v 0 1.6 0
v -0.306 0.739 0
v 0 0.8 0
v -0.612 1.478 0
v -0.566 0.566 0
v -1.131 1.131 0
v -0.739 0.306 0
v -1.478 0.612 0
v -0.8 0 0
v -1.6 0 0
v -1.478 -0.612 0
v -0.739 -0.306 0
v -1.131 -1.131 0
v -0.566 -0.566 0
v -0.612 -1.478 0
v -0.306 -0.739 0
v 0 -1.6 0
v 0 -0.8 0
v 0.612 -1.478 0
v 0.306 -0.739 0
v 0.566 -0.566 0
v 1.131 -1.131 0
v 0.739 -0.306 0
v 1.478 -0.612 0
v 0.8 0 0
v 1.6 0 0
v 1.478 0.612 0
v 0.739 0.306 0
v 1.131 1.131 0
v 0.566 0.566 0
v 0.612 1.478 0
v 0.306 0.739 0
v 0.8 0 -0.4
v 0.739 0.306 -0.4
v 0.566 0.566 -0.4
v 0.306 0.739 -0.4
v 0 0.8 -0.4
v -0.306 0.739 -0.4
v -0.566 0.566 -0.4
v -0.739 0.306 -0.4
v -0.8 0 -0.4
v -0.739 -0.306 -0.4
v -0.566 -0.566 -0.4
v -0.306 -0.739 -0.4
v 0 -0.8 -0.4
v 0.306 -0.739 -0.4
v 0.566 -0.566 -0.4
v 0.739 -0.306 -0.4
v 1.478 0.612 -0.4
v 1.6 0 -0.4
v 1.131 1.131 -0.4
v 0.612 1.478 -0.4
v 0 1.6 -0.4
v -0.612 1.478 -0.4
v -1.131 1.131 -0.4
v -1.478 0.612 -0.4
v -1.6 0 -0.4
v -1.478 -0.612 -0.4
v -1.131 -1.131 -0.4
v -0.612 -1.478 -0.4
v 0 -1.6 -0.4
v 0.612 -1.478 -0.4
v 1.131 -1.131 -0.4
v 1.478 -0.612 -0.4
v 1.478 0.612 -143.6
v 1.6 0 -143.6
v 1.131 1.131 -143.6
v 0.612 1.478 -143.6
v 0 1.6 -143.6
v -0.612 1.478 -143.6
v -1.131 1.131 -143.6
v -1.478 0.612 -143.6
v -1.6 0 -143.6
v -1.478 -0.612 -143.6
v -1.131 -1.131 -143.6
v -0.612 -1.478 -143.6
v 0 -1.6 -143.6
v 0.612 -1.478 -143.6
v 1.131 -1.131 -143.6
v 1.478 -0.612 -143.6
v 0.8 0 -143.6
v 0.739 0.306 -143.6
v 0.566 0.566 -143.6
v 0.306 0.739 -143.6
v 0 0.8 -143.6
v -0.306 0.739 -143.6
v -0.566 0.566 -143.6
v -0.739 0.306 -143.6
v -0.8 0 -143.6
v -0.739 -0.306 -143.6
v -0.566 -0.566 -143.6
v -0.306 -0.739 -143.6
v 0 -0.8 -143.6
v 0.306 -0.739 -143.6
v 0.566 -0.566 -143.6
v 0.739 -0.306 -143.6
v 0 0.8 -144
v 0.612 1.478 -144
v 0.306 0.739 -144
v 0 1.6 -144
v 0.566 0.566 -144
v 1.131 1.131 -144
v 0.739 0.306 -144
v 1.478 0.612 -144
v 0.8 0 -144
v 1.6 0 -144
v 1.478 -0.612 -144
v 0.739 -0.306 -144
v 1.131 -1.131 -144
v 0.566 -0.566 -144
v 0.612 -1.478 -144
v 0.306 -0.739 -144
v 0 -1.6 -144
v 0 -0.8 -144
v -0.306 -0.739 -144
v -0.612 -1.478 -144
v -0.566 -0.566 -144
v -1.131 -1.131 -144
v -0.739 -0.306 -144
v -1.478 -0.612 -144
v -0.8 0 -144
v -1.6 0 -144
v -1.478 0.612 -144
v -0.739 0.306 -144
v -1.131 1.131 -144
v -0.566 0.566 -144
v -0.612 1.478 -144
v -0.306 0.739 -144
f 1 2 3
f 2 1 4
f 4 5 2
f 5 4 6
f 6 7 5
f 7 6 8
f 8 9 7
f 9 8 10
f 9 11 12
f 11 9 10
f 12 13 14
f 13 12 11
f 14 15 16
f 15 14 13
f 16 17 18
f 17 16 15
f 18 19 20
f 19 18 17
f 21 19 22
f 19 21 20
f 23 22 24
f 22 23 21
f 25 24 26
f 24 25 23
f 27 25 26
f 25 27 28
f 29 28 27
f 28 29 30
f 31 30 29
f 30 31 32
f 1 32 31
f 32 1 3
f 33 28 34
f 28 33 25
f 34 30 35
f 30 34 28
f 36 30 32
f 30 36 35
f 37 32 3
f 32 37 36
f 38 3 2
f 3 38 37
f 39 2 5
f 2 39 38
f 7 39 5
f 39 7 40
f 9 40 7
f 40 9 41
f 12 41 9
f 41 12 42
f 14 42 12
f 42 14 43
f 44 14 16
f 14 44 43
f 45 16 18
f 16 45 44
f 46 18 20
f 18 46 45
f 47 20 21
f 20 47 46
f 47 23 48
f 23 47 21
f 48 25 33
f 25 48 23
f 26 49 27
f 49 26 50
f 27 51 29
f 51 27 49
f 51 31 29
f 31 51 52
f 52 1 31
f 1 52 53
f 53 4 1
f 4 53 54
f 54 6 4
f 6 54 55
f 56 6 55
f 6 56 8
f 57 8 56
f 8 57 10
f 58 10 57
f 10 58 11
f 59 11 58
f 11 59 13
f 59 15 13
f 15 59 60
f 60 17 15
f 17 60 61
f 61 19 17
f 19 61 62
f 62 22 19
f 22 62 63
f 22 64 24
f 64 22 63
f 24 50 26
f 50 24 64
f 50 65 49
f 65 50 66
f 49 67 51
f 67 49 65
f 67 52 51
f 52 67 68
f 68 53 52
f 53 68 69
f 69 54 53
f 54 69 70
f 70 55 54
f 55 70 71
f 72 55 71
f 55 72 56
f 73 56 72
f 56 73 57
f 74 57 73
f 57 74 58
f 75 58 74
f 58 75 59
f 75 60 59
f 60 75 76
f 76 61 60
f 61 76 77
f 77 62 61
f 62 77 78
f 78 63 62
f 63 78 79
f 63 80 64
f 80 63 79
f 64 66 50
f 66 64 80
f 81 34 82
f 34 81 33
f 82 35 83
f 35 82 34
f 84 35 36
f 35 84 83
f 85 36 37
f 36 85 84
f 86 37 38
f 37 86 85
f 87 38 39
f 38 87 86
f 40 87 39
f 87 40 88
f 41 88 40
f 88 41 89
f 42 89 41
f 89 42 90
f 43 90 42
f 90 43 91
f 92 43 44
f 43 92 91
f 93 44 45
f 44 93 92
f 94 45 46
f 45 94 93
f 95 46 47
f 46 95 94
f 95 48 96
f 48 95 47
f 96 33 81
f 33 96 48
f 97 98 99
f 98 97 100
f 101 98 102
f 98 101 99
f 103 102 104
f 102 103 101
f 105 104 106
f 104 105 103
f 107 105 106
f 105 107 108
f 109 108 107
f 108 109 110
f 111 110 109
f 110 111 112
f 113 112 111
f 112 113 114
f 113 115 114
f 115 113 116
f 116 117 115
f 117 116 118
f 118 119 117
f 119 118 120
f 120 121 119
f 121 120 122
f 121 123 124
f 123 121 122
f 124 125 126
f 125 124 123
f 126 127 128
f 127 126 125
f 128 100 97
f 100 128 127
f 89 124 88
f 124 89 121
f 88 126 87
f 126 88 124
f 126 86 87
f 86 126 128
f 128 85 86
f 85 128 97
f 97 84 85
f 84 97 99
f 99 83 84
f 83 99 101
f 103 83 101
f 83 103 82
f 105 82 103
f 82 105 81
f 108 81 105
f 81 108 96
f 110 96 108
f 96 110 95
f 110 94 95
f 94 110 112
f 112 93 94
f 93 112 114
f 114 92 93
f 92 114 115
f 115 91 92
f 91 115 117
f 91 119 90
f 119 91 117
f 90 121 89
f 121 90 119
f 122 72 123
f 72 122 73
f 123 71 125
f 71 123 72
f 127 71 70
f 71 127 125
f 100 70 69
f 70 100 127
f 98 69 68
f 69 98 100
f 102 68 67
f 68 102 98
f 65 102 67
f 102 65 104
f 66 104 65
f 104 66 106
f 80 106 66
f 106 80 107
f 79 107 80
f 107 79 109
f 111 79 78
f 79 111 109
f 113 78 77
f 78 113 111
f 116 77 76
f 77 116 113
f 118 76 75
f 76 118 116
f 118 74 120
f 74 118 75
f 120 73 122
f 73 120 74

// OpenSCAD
// file: ../p/4-4ring1.scad
use <../lib.scad>
function ldraw_lib__4_4ring1() = [
// 0 Ring  1 x 1.0
// 0 Name: 4-4ring1.dat
// 0 Author: James Jessiman
// 0 !LDRAW_ORG Primitive UPDATE 2009-01
// 0 !LICENSE Licensed under CC BY 2.0 and CC BY 4.0 : see CAreadme.txt
// 
// 0 BFC CERTIFY CCW
  [0,"BFC","CERTIFY"],
  [0,"BFC","CCW"],
// 
// 0 !HISTORY 1998-12-15 [PTadmin] Official Update 1998-10
// 0 !HISTORY 2002-04-08 [BrickCaster] Modified for BFC compliance
// 0 !HISTORY 2002-04-25 [PTadmin] Official Update 2002-02
// 0 !HISTORY 2007-06-24 [PTadmin] Header formatted for Contributor Agreement
// 0 !HISTORY 2008-07-01 [PTadmin] Official Update 2008-01
// 0 !HISTORY 2008-08-26 [cwdee] Switch polygon winding and rename
// 0 !HISTORY 2009-05-02 [PTadmin] Official Update 2009-01
// 
// 
// 4 16 -0.7654 0 1.8478 -0.3827 0 0.9239 0 0 1 0 0 2
  [4,16,-0.7654,0,1.8478,-0.3827,0,0.9239,0,0,1,0,0,2],
// 4 16 -1.4142 0 1.4142 -0.7071 0 0.7071 -0.3827 0 0.9239 -0.7654 0 1.8478
  [4,16,-1.4142,0,1.4142,-0.7071,0,0.7071,-0.3827,0,0.9239,-0.7654,0,1.8478],
// 4 16 -1.8478 0 0.7654 -0.9239 0 0.3827 -0.7071 0 0.7071 -1.4142 0 1.41420
  [4,16,-1.8478,0,0.7654,-0.9239,0,0.3827,-0.7071,0,0.7071,-1.4142,0,1.41420],
// 4 16 -2 0 0 -1 0 0 -0.9239 0 0.3827 -1.8478 0 0.7654
  [4,16,-2,0,0,-1,0,0,-0.9239,0,0.3827,-1.8478,0,0.7654],
// 4 16 -1.8478 0 -0.7654 -0.9239 0 -0.3827 -1 0 0 -2 0 0
  [4,16,-1.8478,0,-0.7654,-0.9239,0,-0.3827,-1,0,0,-2,0,0],
// 4 16 -1.4142 0 -1.4142 -0.7071 0 -0.7071 -0.9239 0 -0.3827 -1.8478 0 -0.7654
  [4,16,-1.4142,0,-1.4142,-0.7071,0,-0.7071,-0.9239,0,-0.3827,-1.8478,0,-0.7654],
// 4 16 -0.7654 0 -1.8478 -0.3827 0 -0.9239 -0.7071 0 -0.7071 -1.4142 0 -1.4142
  [4,16,-0.7654,0,-1.8478,-0.3827,0,-0.9239,-0.7071,0,-0.7071,-1.4142,0,-1.4142],
// 4 16 0 0 -2 0 0 -1 -0.3827 0 -0.9239 -0.7654 0 -1.8478
  [4,16,0,0,-2,0,0,-1,-0.3827,0,-0.9239,-0.7654,0,-1.8478],
// 4 16 0.7654 0 -1.8478 0.3827 0 -0.9239 0 0 -1 0 0 -2
  [4,16,0.7654,0,-1.8478,0.3827,0,-0.9239,0,0,-1,0,0,-2],
// 4 16 1.4142 0 -1.4142 0.7071 0 -0.7071 0.3827 0 -0.9239 0.7654 0 -1.8478
  [4,16,1.4142,0,-1.4142,0.7071,0,-0.7071,0.3827,0,-0.9239,0.7654,0,-1.8478],
// 4 16 1.8478 0 -0.7654 0.9239 0 -0.3827 0.7071 0 -0.7071 1.4142 0 -1.4142
  [4,16,1.8478,0,-0.7654,0.9239,0,-0.3827,0.7071,0,-0.7071,1.4142,0,-1.4142],
// 4 16 2 0 0 1 0 0 0.9239 0 -0.3827 1.8478 0 -0.7654
  [4,16,2,0,0,1,0,0,0.9239,0,-0.3827,1.8478,0,-0.7654],
// 4 16 1.8478 0 0.7654 0.9239 0 0.3827 1 0 0 2 0 0
  [4,16,1.8478,0,0.7654,0.9239,0,0.3827,1,0,0,2,0,0],
// 4 16 1.4142 0 1.4142 0.7071 0 0.7071 0.9239 0 0.3827 1.8478 0 0.7654
  [4,16,1.4142,0,1.4142,0.7071,0,0.7071,0.9239,0,0.3827,1.8478,0,0.7654],
// 4 16 0.7654 0 1.8478 0.3827 0 0.9239 0.7071 0 0.7071 1.4142 0 1.4142
  [4,16,0.7654,0,1.8478,0.3827,0,0.9239,0.7071,0,0.7071,1.4142,0,1.4142],
// 4 16 0 0 2 0 0 1 0.3827 0 0.9239 0.7654 0 1.8478
  [4,16,0,0,2,0,0,1,0.3827,0,0.9239,0.7654,0,1.8478],
// 0
];
module ldraw_lib__4_4ring1(step=0, col=false, unit=2/5, alt=false, line=0.2, solid=!$preview)
    makepoly(ldraw_lib__4_4ring1(), step=step, col=col, unit=unit, alt=alt, line=line, solid=solid);
ldraw_lib__4_4ring1(line=0.2);
// file: ../p/4-4edge.scad
use <../lib.scad>
function ldraw_lib__4_4edge() = [
// 0 Circle 1.0
// 0 Name: 4-4edge.dat
// 0 Author: James Jessiman
// 0 !LDRAW_ORG Primitive UPDATE 2017-01
// 0 !LICENSE Licensed under CC BY 2.0 and CC BY 4.0 : see CAreadme.txt
// 
// 0 BFC CERTIFY CCW
  [0,"BFC","CERTIFY"],
  [0,"BFC","CCW"],
// 
// 0 !HISTORY 1998-12-15 [PTadmin] Official Update 1998-10
// 0 !HISTORY 2005-12-28 [PTadmin] Official Update 2005-01
// 0 !HISTORY 2007-06-24 [PTadmin] Header formatted for Contributor Agreement
// 0 !HISTORY 2008-07-01 [PTadmin] Official Update 2008-01
// 0 !HISTORY 2017-01-15 [Steffen] BFCed
// 0 !HISTORY 2017-12-30 [PTadmin] Official Update 2017-01
// 
// 
// 2 24 1 0 0 0.9239 0 0.3827
  [2,24,1,0,0,0.9239,0,0.3827],
// 2 24 0.9239 0 0.3827 0.7071 0 0.7071
  [2,24,0.9239,0,0.3827,0.7071,0,0.7071],
// 2 24 0.7071 0 0.7071 0.3827 0 0.9239
  [2,24,0.7071,0,0.7071,0.3827,0,0.9239],
// 2 24 0.3827 0 0.9239 0 0 1
  [2,24,0.3827,0,0.9239,0,0,1],
// 2 24 0 0 1 -0.3827 0 0.9239
  [2,24,0,0,1,-0.3827,0,0.9239],
// 2 24 -0.3827 0 0.9239 -0.7071 0 0.7071
  [2,24,-0.3827,0,0.9239,-0.7071,0,0.7071],
// 2 24 -0.7071 0 0.7071 -0.9239 0 0.3827
  [2,24,-0.7071,0,0.7071,-0.9239,0,0.3827],
// 2 24 -0.9239 0 0.3827 -1 0 -0
  [2,24,-0.9239,0,0.3827,-1,0,-0],
// 2 24 -1 0 -0 -0.9239 0 -0.3827
  [2,24,-1,0,-0,-0.9239,0,-0.3827],
// 2 24 -0.9239 0 -0.3827 -0.7071 0 -0.7071
  [2,24,-0.9239,0,-0.3827,-0.7071,0,-0.7071],
// 2 24 -0.7071 0 -0.7071 -0.3827 0 -0.9239
  [2,24,-0.7071,0,-0.7071,-0.3827,0,-0.9239],
// 2 24 -0.3827 0 -0.9239 0 0 -1
  [2,24,-0.3827,0,-0.9239,0,0,-1],
// 2 24 0 0 -1 0.3827 0 -0.9239
  [2,24,0,0,-1,0.3827,0,-0.9239],
// 2 24 0.3827 0 -0.9239 0.7071 0 -0.7071
  [2,24,0.3827,0,-0.9239,0.7071,0,-0.7071],
// 2 24 0.7071 0 -0.7071 0.9239 0 -0.3827
  [2,24,0.7071,0,-0.7071,0.9239,0,-0.3827],
// 2 24 0.9239 0 -0.3827 1 0 0
  [2,24,0.9239,0,-0.3827,1,0,0],
];
module ldraw_lib__4_4edge(step=0, col=false, unit=2/5, alt=false, line=0.2, solid=!$preview)
    makepoly(ldraw_lib__4_4edge(), step=step, col=col, unit=unit, alt=alt, line=line, solid=solid);
ldraw_lib__4_4edge(line=0.2);
// file: ../p/4-4cyli.scad
use <../lib.scad>
function ldraw_lib__4_4cyli() = [
// 0 Cylinder 1.0
// 0 Name: 4-4cyli.dat
// 0 Author: James Jessiman
// 0 !LDRAW_ORG Primitive UPDATE 2005-01
// 0 !LICENSE Licensed under CC BY 2.0 and CC BY 4.0 : see CAreadme.txt
// 
// 0 BFC CERTIFY CCW
  [0,"BFC","CERTIFY"],
  [0,"BFC","CCW"],
// 
// 0 !HISTORY 1998-12-15 [PTadmin] Official Update 1998-10
// 0 !HISTORY 2002-03-23 [sbliss] Added BFC statement; merged headers from files in distributions LDraw 0.27 and Complete.
// 0 !HISTORY 2002-04-25 [PTadmin] Official Update 2002-02
// 0 !HISTORY 2004-12-14 [guyvivan] BFC CCW
// 0 !HISTORY 2005-12-28 [PTadmin] Official Update 2005-01
// 0 !HISTORY 2007-06-24 [PTadmin] Header formatted for Contributor Agreement
// 0 !HISTORY 2008-07-01 [PTadmin] Official Update 2008-01
// 
// 
// 4 16 1 1 0 0.9239 1 0.3827 0.9239 0 0.3827 1 0 0
  [4,16,1,1,0,0.9239,1,0.3827,0.9239,0,0.3827,1,0,0],
// 5 24 1 0 0 1 1 0 0.9239 0 0.3827 0.9239 0 -0.3827
  [5,24,1,0,0,1,1,0,0.9239,0,0.3827,0.9239,0,-0.3827],
// 4 16 0.9239 1 0.3827 0.7071 1 0.7071 0.7071 0 0.7071 0.9239 0 0.3827
  [4,16,0.9239,1,0.3827,0.7071,1,0.7071,0.7071,0,0.7071,0.9239,0,0.3827],
// 5 24 0.9239 0 0.3827 0.9239 1 0.3827 0.7071 0 0.7071 1 0 0
  [5,24,0.9239,0,0.3827,0.9239,1,0.3827,0.7071,0,0.7071,1,0,0],
// 4 16 0.7071 1 0.7071 0.3827 1 0.9239 0.3827 0 0.9239 0.7071 0 0.7071
  [4,16,0.7071,1,0.7071,0.3827,1,0.9239,0.3827,0,0.9239,0.7071,0,0.7071],
// 5 24 0.7071 0 0.7071 0.7071 1 0.7071 0.3827 0 0.9239 0.9239 0 0.3827
  [5,24,0.7071,0,0.7071,0.7071,1,0.7071,0.3827,0,0.9239,0.9239,0,0.3827],
// 4 16 0.3827 1 0.9239 0 1 1 0 0 1 0.3827 0 0.9239
  [4,16,0.3827,1,0.9239,0,1,1,0,0,1,0.3827,0,0.9239],
// 5 24 0.3827 0 0.9239 0.3827 1 0.9239 0 0 1 0.7071 0 0.7071
  [5,24,0.3827,0,0.9239,0.3827,1,0.9239,0,0,1,0.7071,0,0.7071],
// 4 16 0 1 1 -0.3827 1 0.9239 -0.3827 0 0.9239 0 0 1
  [4,16,0,1,1,-0.3827,1,0.9239,-0.3827,0,0.9239,0,0,1],
// 5 24 0 0 1 0 1 1 -0.3827 0 0.9239 0.3827 0 0.9239
  [5,24,0,0,1,0,1,1,-0.3827,0,0.9239,0.3827,0,0.9239],
// 4 16 -0.3827 1 0.9239 -0.7071 1 0.7071 -0.7071 0 0.7071 -0.3827 0 0.9239
  [4,16,-0.3827,1,0.9239,-0.7071,1,0.7071,-0.7071,0,0.7071,-0.3827,0,0.9239],
// 5 24 -0.3827 0 0.9239 -0.3827 1 0.9239 -0.7071 0 0.7071 0 0 1
  [5,24,-0.3827,0,0.9239,-0.3827,1,0.9239,-0.7071,0,0.7071,0,0,1],
// 4 16 -0.7071 1 0.7071 -0.9239 1 0.3827 -0.9239 0 0.3827 -0.7071 0 0.7071
  [4,16,-0.7071,1,0.7071,-0.9239,1,0.3827,-0.9239,0,0.3827,-0.7071,0,0.7071],
// 5 24 -0.7071 0 0.7071 -0.7071 1 0.7071 -0.9239 0 0.3827 -0.3827 0 0.9239
  [5,24,-0.7071,0,0.7071,-0.7071,1,0.7071,-0.9239,0,0.3827,-0.3827,0,0.9239],
// 4 16 -0.9239 1 0.3827 -1 1 0 -1 0 0 -0.9239 0 0.3827
  [4,16,-0.9239,1,0.3827,-1,1,0,-1,0,0,-0.9239,0,0.3827],
// 5 24 -0.9239 0 0.3827 -0.9239 1 0.3827 -1 0 0 -0.7071 0 0.7071
  [5,24,-0.9239,0,0.3827,-0.9239,1,0.3827,-1,0,0,-0.7071,0,0.7071],
// 4 16 -1 1 0 -0.9239 1 -0.3827 -0.9239 0 -0.3827 -1 0 0
  [4,16,-1,1,0,-0.9239,1,-0.3827,-0.9239,0,-0.3827,-1,0,0],
// 5 24 -1 0 0 -1 1 0 -0.9239 0 -0.3827 -0.9239 0 0.3827
  [5,24,-1,0,0,-1,1,0,-0.9239,0,-0.3827,-0.9239,0,0.3827],
// 4 16 -0.9239 1 -0.3827 -0.7071 1 -0.7071 -0.7071 0 -0.7071 -0.9239 0 -0.3827
  [4,16,-0.9239,1,-0.3827,-0.7071,1,-0.7071,-0.7071,0,-0.7071,-0.9239,0,-0.3827],
// 5 24 -0.9239 0 -0.3827 -0.9239 1 -0.3827 -0.7071 0 -0.7071 -1 0 0
  [5,24,-0.9239,0,-0.3827,-0.9239,1,-0.3827,-0.7071,0,-0.7071,-1,0,0],
// 4 16 -0.7071 1 -0.7071 -0.3827 1 -0.9239 -0.3827 0 -0.9239 -0.7071 0 -0.7071
  [4,16,-0.7071,1,-0.7071,-0.3827,1,-0.9239,-0.3827,0,-0.9239,-0.7071,0,-0.7071],
// 5 24 -0.7071 0 -0.7071 -0.7071 1 -0.7071 -0.3827 0 -0.9239 -0.9239 0 -0.3827
  [5,24,-0.7071,0,-0.7071,-0.7071,1,-0.7071,-0.3827,0,-0.9239,-0.9239,0,-0.3827],
// 4 16 -0.3827 1 -0.9239 0 1 -1 0 0 -1 -0.3827 0 -0.9239
  [4,16,-0.3827,1,-0.9239,0,1,-1,0,0,-1,-0.3827,0,-0.9239],
// 5 24 -0.3827 0 -0.9239 -0.3827 1 -0.9239 0 0 -1 -0.7071 0 -0.7071
  [5,24,-0.3827,0,-0.9239,-0.3827,1,-0.9239,0,0,-1,-0.7071,0,-0.7071],
// 4 16 0 1 -1 0.3827 1 -0.9239 0.3827 0 -0.9239 0 0 -1
  [4,16,0,1,-1,0.3827,1,-0.9239,0.3827,0,-0.9239,0,0,-1],
// 5 24 0 0 -1 0 1 -1 0.3827 0 -0.9239 -0.3827 0 -0.9239
  [5,24,0,0,-1,0,1,-1,0.3827,0,-0.9239,-0.3827,0,-0.9239],
// 4 16 0.3827 1 -0.9239 0.7071 1 -0.7071 0.7071 0 -0.7071 0.3827 0 -0.9239
  [4,16,0.3827,1,-0.9239,0.7071,1,-0.7071,0.7071,0,-0.7071,0.3827,0,-0.9239],
// 5 24 0.3827 0 -0.9239 0.3827 1 -0.9239 0.7071 0 -0.7071 0 0 -1
  [5,24,0.3827,0,-0.9239,0.3827,1,-0.9239,0.7071,0,-0.7071,0,0,-1],
// 4 16 0.7071 1 -0.7071 0.9239 1 -0.3827 0.9239 0 -0.3827 0.7071 0 -0.7071
  [4,16,0.7071,1,-0.7071,0.9239,1,-0.3827,0.9239,0,-0.3827,0.7071,0,-0.7071],
// 5 24 0.7071 0 -0.7071 0.7071 1 -0.7071 0.9239 0 -0.3827 0.3827 0 -0.9239
  [5,24,0.7071,0,-0.7071,0.7071,1,-0.7071,0.9239,0,-0.3827,0.3827,0,-0.9239],
// 4 16 0.9239 1 -0.3827 1 1 0 1 0 0 0.9239 0 -0.3827
  [4,16,0.9239,1,-0.3827,1,1,0,1,0,0,0.9239,0,-0.3827],
// 5 24 0.9239 0 -0.3827 0.9239 1 -0.3827 1 0 0 0.7071 0 -0.7071
  [5,24,0.9239,0,-0.3827,0.9239,1,-0.3827,1,0,0,0.7071,0,-0.7071],
// 0
];
module ldraw_lib__4_4cyli(step=0, col=false, unit=2/5, alt=false, line=0.2, solid=!$preview)
    makepoly(ldraw_lib__4_4cyli(), step=step, col=col, unit=unit, alt=alt, line=line, solid=solid);
ldraw_lib__4_4cyli(line=0.2);
// file: u9053.scad
use <../lib.scad>
use <../p/4-4cyli.scad>
use <../p/4-4edge.scad>
use <../p/4-4ring1.scad>
function ldraw_lib__u9053() = [
// 0 ~Technic Flex-System Hose End
// 0 Name: u9053.dat
// 0 Author: William Howard [WilliamH]
// 0 !LDRAW_ORG Part UPDATE 2011-02
// 0 !LICENSE Licensed under CC BY 2.0 and CC BY 4.0 : see CAreadme.txt
// 
// 0 BFC CERTIFY CCW
  [0,"BFC","CERTIFY"],
  [0,"BFC","CCW"],
// 
// 0 !HISTORY 2011-12-21 [cwdee] Reworked subparting technique
// 0 !HISTORY 2011-12-23 [PTadmin] Renamed from 76
// 0 !HISTORY 2011-12-29 [PTadmin] Official Update 2011-02
// 
// 
// 1 16 0 0 0 2 0 0 0 1 0 0 0 2 4-4ring1.dat
  [1,16,0,0,0,2,0,0,0,1,0,0,0,2, ldraw_lib__4_4ring1()],
// 1 16 0 0 0 2 0 0 0 1 0 0 0 2 4-4edge.dat
  [1,16,0,0,0,2,0,0,0,1,0,0,0,2, ldraw_lib__4_4edge()],
// 0 BFC INVERTNEXT
  [0,"BFC","INVERTNEXT"],
// 1 16 0 0 0 2 0 0 0 1 0 0 0 2 4-4cyli.dat
  [1,16,0,0,0,2,0,0,0,1,0,0,0,2, ldraw_lib__4_4cyli()],
// 1 16 0 0 0 4 0 0 0 1 0 0 0 4 4-4edge.dat
  [1,16,0,0,0,4,0,0,0,1,0,0,0,4, ldraw_lib__4_4edge()],
// 1 16 0 0 0 4 0 0 0 1 0 0 0 4 4-4cyli.dat
  [1,16,0,0,0,4,0,0,0,1,0,0,0,4, ldraw_lib__4_4cyli()],
// 0
];
module ldraw_lib__u9053(step=0, col=false, unit=2/5, alt=false, line=0.2, solid=!$preview)
    makepoly(ldraw_lib__u9053(), step=step, col=col, unit=unit, alt=alt, line=line, solid=solid);
ldraw_lib__u9053(line=0.2);
// file: 77.scad
use <../lib.scad>
use <../p/4-4cyli.scad>
function ldraw_lib__77() = [
// 0 ~Technic Flex-System Hose Segment
// 0 Name: 77.dat
// 0 Author: William Howard [WilliamH]
// 0 !LDRAW_ORG Part UPDATE 2011-02
// 0 !LICENSE Licensed under CC BY 2.0 and CC BY 4.0 : see CAreadme.txt
// 
// 0 BFC CERTIFY CCW
  [0,"BFC","CERTIFY"],
  [0,"BFC","CCW"],
// 
// 0 !HISTORY 2011-12-21 [cwdee] Reworked subparting technique
// 0 !HISTORY 2011-12-29 [PTadmin] Official Update 2011-02
// 
// 
// 1 16 0 0 0 4 0 0 0 1 0 0 0 4 4-4cyli.dat
  [1,16,0,0,0,4,0,0,0,1,0,0,0,4, ldraw_lib__4_4cyli()],
// 0 BFC INVERTNEXT
  [0,"BFC","INVERTNEXT"],
// 1 16 0 0 0 2 0 0 0 1 0 0 0 2 4-4cyli.dat
  [1,16,0,0,0,2,0,0,0,1,0,0,0,2, ldraw_lib__4_4cyli()],
// 0
];
module ldraw_lib__77(step=0, col=false, unit=2/5, alt=false, line=0.2, solid=!$preview)
    makepoly(ldraw_lib__77(), step=step, col=col, unit=unit, alt=alt, line=line, solid=solid);
ldraw_lib__77(line=0.2);
// main file
use <../lib.scad>
use <77.scad>
use <u9053.scad>
function ldraw_lib__71582() = [
// 0 Technic Flex-System Hose 18L (360LDU)
// 0 Name: 71582.dat
// 0 Author: Tim Gould [timgould]
// 0 !LDRAW_ORG Part UPDATE 2011-02
// 0 !LICENSE Licensed under CC BY 2.0 and CC BY 4.0 : see CAreadme.txt
// 
// 0 BFC CERTIFY CCW
  [0,"BFC","CERTIFY"],
  [0,"BFC","CCW"],
// 
// 0 !KEYWORDS bar, tube
// 
// 0 !HISTORY 2011-12-29 [PTadmin] Official Update 2011-02
// 
// 
// 1 16 0 0 0 1 0 0 0 1 0 0 0 1 u9053.dat
  [1,16,0,0,0,1,0,0,0,1,0,0,0,1, ldraw_lib__u9053()],
// 1 16 0 1 0 1 0 0 0 358 0 0 0 1 77.dat
  [1,16,0,1,0,1,0,0,0,358,0,0,0,1, ldraw_lib__77()],
// 1 16 0 360 0 -1 0 0 0 -1 0 0 0 1 u9053.dat
  [1,16,0,360,0,-1,0,0,0,-1,0,0,0,1, ldraw_lib__u9053()],
];
module ldraw_lib__71582(step=0, col=false, unit=2/5, alt=false, line=0.2, solid=!$preview)
    makepoly(ldraw_lib__71582(), step=step, col=col, unit=unit, alt=alt, line=line, solid=solid);
ldraw_lib__71582(line=0.2);
